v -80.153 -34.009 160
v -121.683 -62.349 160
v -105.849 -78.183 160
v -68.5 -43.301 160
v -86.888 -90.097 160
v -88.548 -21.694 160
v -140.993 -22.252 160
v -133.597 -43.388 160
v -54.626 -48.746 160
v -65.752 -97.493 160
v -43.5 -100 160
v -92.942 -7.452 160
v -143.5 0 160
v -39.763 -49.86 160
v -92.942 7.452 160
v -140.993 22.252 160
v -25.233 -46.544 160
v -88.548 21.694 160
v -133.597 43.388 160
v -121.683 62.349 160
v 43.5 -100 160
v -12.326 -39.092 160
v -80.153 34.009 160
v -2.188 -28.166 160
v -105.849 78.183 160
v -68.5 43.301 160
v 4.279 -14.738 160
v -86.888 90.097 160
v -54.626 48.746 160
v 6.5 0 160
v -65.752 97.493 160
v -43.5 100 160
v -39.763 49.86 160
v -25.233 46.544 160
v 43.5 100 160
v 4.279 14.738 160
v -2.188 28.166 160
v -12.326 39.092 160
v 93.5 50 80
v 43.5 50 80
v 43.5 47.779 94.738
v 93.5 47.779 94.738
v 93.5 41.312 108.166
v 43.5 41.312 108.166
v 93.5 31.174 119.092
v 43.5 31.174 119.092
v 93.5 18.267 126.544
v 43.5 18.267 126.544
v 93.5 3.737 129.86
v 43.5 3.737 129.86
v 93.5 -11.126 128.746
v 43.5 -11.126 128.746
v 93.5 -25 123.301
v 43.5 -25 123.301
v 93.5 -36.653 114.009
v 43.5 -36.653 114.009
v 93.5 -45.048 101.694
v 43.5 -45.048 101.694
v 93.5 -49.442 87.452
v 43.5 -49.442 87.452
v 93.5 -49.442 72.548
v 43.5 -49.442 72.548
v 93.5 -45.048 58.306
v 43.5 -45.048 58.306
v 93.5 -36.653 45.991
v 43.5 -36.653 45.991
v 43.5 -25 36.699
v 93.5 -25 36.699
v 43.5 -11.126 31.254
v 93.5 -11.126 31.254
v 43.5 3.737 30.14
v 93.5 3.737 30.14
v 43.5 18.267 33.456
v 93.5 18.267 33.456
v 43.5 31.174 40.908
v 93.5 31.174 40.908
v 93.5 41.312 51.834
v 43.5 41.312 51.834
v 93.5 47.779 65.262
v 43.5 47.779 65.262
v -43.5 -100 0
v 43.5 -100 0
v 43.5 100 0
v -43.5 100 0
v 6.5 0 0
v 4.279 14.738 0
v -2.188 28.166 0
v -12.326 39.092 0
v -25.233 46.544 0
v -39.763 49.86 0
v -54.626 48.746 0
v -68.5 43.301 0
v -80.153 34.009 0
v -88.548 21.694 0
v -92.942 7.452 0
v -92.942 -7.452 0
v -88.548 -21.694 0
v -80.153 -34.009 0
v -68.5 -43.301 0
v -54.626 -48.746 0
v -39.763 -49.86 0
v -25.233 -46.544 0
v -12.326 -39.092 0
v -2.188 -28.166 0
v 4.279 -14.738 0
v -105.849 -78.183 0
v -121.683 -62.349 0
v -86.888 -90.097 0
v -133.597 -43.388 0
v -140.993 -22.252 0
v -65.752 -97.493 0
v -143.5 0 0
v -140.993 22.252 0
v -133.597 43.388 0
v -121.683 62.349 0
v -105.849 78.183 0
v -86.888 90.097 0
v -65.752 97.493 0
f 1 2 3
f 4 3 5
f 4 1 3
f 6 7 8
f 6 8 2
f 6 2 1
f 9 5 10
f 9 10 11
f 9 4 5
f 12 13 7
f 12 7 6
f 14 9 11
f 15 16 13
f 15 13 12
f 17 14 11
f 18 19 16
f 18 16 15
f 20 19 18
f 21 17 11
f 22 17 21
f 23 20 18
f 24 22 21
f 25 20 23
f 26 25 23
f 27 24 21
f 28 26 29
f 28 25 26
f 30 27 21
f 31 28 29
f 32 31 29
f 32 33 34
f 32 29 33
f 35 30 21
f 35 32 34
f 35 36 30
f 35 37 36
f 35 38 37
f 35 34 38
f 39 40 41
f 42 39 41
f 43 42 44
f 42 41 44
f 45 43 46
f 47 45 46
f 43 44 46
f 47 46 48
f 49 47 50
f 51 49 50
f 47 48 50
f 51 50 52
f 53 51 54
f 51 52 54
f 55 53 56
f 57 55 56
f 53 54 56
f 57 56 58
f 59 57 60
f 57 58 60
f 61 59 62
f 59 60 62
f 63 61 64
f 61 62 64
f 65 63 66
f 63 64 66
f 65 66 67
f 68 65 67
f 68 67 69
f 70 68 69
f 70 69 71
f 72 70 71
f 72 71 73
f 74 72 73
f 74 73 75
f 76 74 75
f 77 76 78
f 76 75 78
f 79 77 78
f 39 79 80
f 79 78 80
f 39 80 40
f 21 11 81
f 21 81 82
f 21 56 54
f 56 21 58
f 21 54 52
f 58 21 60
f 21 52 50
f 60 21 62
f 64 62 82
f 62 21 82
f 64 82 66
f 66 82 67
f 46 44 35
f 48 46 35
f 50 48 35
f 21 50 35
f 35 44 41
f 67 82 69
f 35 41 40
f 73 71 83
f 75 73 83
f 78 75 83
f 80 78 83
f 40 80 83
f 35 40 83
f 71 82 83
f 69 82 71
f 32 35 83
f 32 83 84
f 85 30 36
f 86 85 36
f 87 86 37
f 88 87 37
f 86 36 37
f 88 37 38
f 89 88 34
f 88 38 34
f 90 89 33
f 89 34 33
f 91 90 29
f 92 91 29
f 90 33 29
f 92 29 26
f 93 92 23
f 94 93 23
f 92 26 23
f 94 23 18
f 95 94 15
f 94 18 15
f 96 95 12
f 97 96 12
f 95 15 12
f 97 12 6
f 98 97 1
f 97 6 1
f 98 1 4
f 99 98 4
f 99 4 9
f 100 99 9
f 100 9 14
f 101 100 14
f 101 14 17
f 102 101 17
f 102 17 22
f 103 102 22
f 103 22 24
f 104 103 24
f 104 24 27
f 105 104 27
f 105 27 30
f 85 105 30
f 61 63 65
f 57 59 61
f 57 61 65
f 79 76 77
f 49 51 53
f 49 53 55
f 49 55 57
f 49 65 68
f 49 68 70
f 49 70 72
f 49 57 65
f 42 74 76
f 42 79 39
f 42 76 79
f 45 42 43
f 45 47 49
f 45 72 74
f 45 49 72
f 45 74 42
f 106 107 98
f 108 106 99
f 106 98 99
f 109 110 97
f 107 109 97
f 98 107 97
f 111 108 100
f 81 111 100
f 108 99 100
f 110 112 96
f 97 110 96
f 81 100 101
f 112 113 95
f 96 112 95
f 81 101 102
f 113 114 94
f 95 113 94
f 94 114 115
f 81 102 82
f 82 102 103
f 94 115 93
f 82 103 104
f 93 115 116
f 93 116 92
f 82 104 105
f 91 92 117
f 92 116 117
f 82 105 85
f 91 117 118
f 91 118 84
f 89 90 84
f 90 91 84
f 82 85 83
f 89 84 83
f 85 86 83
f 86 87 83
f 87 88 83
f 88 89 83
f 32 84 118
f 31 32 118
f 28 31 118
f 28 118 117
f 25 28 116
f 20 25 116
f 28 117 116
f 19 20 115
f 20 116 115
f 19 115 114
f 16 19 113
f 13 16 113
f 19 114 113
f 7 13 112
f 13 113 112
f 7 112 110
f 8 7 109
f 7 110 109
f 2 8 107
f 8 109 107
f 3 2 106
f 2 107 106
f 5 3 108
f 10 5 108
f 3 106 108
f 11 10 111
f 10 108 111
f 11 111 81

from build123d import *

# Parameters (mm, degrees)
F1_DEPTH = 160
F2_R     = 50
F3_DEPTH = 504
F4_R     = 50
F5_DEPTH = 50


with BuildPart() as f1:
    # F0 (on Top) → F1 (new body)
    with BuildSketch(Plane.XY):
        with BuildLine():
            Line((-43.5, -100), (43.5, -100))
            Line((43.5, -100), (43.5, 100))
            Line((43.5, 100), (-43.5, 100))
            ThreePointArc((-43.5, 100), (-143.5, 0), (-43.5, -100))
        make_face()
    extrude(amount=F1_DEPTH)

    # F2 (on face) → F3 (cut)
    with BuildSketch(Plane.XY.offset(160)):
        with Locations((-43.5, 0)):
            Circle(F2_R)
    extrude(amount=-F3_DEPTH, mode=Mode.SUBTRACT)

    # F4 (on face) → F5 (join)
    with BuildSketch(Plane.YZ.offset(43.5)):
        with Locations((0, 80)):
            Circle(F4_R)
    extrude(amount=F5_DEPTH)


solid = f1.part
